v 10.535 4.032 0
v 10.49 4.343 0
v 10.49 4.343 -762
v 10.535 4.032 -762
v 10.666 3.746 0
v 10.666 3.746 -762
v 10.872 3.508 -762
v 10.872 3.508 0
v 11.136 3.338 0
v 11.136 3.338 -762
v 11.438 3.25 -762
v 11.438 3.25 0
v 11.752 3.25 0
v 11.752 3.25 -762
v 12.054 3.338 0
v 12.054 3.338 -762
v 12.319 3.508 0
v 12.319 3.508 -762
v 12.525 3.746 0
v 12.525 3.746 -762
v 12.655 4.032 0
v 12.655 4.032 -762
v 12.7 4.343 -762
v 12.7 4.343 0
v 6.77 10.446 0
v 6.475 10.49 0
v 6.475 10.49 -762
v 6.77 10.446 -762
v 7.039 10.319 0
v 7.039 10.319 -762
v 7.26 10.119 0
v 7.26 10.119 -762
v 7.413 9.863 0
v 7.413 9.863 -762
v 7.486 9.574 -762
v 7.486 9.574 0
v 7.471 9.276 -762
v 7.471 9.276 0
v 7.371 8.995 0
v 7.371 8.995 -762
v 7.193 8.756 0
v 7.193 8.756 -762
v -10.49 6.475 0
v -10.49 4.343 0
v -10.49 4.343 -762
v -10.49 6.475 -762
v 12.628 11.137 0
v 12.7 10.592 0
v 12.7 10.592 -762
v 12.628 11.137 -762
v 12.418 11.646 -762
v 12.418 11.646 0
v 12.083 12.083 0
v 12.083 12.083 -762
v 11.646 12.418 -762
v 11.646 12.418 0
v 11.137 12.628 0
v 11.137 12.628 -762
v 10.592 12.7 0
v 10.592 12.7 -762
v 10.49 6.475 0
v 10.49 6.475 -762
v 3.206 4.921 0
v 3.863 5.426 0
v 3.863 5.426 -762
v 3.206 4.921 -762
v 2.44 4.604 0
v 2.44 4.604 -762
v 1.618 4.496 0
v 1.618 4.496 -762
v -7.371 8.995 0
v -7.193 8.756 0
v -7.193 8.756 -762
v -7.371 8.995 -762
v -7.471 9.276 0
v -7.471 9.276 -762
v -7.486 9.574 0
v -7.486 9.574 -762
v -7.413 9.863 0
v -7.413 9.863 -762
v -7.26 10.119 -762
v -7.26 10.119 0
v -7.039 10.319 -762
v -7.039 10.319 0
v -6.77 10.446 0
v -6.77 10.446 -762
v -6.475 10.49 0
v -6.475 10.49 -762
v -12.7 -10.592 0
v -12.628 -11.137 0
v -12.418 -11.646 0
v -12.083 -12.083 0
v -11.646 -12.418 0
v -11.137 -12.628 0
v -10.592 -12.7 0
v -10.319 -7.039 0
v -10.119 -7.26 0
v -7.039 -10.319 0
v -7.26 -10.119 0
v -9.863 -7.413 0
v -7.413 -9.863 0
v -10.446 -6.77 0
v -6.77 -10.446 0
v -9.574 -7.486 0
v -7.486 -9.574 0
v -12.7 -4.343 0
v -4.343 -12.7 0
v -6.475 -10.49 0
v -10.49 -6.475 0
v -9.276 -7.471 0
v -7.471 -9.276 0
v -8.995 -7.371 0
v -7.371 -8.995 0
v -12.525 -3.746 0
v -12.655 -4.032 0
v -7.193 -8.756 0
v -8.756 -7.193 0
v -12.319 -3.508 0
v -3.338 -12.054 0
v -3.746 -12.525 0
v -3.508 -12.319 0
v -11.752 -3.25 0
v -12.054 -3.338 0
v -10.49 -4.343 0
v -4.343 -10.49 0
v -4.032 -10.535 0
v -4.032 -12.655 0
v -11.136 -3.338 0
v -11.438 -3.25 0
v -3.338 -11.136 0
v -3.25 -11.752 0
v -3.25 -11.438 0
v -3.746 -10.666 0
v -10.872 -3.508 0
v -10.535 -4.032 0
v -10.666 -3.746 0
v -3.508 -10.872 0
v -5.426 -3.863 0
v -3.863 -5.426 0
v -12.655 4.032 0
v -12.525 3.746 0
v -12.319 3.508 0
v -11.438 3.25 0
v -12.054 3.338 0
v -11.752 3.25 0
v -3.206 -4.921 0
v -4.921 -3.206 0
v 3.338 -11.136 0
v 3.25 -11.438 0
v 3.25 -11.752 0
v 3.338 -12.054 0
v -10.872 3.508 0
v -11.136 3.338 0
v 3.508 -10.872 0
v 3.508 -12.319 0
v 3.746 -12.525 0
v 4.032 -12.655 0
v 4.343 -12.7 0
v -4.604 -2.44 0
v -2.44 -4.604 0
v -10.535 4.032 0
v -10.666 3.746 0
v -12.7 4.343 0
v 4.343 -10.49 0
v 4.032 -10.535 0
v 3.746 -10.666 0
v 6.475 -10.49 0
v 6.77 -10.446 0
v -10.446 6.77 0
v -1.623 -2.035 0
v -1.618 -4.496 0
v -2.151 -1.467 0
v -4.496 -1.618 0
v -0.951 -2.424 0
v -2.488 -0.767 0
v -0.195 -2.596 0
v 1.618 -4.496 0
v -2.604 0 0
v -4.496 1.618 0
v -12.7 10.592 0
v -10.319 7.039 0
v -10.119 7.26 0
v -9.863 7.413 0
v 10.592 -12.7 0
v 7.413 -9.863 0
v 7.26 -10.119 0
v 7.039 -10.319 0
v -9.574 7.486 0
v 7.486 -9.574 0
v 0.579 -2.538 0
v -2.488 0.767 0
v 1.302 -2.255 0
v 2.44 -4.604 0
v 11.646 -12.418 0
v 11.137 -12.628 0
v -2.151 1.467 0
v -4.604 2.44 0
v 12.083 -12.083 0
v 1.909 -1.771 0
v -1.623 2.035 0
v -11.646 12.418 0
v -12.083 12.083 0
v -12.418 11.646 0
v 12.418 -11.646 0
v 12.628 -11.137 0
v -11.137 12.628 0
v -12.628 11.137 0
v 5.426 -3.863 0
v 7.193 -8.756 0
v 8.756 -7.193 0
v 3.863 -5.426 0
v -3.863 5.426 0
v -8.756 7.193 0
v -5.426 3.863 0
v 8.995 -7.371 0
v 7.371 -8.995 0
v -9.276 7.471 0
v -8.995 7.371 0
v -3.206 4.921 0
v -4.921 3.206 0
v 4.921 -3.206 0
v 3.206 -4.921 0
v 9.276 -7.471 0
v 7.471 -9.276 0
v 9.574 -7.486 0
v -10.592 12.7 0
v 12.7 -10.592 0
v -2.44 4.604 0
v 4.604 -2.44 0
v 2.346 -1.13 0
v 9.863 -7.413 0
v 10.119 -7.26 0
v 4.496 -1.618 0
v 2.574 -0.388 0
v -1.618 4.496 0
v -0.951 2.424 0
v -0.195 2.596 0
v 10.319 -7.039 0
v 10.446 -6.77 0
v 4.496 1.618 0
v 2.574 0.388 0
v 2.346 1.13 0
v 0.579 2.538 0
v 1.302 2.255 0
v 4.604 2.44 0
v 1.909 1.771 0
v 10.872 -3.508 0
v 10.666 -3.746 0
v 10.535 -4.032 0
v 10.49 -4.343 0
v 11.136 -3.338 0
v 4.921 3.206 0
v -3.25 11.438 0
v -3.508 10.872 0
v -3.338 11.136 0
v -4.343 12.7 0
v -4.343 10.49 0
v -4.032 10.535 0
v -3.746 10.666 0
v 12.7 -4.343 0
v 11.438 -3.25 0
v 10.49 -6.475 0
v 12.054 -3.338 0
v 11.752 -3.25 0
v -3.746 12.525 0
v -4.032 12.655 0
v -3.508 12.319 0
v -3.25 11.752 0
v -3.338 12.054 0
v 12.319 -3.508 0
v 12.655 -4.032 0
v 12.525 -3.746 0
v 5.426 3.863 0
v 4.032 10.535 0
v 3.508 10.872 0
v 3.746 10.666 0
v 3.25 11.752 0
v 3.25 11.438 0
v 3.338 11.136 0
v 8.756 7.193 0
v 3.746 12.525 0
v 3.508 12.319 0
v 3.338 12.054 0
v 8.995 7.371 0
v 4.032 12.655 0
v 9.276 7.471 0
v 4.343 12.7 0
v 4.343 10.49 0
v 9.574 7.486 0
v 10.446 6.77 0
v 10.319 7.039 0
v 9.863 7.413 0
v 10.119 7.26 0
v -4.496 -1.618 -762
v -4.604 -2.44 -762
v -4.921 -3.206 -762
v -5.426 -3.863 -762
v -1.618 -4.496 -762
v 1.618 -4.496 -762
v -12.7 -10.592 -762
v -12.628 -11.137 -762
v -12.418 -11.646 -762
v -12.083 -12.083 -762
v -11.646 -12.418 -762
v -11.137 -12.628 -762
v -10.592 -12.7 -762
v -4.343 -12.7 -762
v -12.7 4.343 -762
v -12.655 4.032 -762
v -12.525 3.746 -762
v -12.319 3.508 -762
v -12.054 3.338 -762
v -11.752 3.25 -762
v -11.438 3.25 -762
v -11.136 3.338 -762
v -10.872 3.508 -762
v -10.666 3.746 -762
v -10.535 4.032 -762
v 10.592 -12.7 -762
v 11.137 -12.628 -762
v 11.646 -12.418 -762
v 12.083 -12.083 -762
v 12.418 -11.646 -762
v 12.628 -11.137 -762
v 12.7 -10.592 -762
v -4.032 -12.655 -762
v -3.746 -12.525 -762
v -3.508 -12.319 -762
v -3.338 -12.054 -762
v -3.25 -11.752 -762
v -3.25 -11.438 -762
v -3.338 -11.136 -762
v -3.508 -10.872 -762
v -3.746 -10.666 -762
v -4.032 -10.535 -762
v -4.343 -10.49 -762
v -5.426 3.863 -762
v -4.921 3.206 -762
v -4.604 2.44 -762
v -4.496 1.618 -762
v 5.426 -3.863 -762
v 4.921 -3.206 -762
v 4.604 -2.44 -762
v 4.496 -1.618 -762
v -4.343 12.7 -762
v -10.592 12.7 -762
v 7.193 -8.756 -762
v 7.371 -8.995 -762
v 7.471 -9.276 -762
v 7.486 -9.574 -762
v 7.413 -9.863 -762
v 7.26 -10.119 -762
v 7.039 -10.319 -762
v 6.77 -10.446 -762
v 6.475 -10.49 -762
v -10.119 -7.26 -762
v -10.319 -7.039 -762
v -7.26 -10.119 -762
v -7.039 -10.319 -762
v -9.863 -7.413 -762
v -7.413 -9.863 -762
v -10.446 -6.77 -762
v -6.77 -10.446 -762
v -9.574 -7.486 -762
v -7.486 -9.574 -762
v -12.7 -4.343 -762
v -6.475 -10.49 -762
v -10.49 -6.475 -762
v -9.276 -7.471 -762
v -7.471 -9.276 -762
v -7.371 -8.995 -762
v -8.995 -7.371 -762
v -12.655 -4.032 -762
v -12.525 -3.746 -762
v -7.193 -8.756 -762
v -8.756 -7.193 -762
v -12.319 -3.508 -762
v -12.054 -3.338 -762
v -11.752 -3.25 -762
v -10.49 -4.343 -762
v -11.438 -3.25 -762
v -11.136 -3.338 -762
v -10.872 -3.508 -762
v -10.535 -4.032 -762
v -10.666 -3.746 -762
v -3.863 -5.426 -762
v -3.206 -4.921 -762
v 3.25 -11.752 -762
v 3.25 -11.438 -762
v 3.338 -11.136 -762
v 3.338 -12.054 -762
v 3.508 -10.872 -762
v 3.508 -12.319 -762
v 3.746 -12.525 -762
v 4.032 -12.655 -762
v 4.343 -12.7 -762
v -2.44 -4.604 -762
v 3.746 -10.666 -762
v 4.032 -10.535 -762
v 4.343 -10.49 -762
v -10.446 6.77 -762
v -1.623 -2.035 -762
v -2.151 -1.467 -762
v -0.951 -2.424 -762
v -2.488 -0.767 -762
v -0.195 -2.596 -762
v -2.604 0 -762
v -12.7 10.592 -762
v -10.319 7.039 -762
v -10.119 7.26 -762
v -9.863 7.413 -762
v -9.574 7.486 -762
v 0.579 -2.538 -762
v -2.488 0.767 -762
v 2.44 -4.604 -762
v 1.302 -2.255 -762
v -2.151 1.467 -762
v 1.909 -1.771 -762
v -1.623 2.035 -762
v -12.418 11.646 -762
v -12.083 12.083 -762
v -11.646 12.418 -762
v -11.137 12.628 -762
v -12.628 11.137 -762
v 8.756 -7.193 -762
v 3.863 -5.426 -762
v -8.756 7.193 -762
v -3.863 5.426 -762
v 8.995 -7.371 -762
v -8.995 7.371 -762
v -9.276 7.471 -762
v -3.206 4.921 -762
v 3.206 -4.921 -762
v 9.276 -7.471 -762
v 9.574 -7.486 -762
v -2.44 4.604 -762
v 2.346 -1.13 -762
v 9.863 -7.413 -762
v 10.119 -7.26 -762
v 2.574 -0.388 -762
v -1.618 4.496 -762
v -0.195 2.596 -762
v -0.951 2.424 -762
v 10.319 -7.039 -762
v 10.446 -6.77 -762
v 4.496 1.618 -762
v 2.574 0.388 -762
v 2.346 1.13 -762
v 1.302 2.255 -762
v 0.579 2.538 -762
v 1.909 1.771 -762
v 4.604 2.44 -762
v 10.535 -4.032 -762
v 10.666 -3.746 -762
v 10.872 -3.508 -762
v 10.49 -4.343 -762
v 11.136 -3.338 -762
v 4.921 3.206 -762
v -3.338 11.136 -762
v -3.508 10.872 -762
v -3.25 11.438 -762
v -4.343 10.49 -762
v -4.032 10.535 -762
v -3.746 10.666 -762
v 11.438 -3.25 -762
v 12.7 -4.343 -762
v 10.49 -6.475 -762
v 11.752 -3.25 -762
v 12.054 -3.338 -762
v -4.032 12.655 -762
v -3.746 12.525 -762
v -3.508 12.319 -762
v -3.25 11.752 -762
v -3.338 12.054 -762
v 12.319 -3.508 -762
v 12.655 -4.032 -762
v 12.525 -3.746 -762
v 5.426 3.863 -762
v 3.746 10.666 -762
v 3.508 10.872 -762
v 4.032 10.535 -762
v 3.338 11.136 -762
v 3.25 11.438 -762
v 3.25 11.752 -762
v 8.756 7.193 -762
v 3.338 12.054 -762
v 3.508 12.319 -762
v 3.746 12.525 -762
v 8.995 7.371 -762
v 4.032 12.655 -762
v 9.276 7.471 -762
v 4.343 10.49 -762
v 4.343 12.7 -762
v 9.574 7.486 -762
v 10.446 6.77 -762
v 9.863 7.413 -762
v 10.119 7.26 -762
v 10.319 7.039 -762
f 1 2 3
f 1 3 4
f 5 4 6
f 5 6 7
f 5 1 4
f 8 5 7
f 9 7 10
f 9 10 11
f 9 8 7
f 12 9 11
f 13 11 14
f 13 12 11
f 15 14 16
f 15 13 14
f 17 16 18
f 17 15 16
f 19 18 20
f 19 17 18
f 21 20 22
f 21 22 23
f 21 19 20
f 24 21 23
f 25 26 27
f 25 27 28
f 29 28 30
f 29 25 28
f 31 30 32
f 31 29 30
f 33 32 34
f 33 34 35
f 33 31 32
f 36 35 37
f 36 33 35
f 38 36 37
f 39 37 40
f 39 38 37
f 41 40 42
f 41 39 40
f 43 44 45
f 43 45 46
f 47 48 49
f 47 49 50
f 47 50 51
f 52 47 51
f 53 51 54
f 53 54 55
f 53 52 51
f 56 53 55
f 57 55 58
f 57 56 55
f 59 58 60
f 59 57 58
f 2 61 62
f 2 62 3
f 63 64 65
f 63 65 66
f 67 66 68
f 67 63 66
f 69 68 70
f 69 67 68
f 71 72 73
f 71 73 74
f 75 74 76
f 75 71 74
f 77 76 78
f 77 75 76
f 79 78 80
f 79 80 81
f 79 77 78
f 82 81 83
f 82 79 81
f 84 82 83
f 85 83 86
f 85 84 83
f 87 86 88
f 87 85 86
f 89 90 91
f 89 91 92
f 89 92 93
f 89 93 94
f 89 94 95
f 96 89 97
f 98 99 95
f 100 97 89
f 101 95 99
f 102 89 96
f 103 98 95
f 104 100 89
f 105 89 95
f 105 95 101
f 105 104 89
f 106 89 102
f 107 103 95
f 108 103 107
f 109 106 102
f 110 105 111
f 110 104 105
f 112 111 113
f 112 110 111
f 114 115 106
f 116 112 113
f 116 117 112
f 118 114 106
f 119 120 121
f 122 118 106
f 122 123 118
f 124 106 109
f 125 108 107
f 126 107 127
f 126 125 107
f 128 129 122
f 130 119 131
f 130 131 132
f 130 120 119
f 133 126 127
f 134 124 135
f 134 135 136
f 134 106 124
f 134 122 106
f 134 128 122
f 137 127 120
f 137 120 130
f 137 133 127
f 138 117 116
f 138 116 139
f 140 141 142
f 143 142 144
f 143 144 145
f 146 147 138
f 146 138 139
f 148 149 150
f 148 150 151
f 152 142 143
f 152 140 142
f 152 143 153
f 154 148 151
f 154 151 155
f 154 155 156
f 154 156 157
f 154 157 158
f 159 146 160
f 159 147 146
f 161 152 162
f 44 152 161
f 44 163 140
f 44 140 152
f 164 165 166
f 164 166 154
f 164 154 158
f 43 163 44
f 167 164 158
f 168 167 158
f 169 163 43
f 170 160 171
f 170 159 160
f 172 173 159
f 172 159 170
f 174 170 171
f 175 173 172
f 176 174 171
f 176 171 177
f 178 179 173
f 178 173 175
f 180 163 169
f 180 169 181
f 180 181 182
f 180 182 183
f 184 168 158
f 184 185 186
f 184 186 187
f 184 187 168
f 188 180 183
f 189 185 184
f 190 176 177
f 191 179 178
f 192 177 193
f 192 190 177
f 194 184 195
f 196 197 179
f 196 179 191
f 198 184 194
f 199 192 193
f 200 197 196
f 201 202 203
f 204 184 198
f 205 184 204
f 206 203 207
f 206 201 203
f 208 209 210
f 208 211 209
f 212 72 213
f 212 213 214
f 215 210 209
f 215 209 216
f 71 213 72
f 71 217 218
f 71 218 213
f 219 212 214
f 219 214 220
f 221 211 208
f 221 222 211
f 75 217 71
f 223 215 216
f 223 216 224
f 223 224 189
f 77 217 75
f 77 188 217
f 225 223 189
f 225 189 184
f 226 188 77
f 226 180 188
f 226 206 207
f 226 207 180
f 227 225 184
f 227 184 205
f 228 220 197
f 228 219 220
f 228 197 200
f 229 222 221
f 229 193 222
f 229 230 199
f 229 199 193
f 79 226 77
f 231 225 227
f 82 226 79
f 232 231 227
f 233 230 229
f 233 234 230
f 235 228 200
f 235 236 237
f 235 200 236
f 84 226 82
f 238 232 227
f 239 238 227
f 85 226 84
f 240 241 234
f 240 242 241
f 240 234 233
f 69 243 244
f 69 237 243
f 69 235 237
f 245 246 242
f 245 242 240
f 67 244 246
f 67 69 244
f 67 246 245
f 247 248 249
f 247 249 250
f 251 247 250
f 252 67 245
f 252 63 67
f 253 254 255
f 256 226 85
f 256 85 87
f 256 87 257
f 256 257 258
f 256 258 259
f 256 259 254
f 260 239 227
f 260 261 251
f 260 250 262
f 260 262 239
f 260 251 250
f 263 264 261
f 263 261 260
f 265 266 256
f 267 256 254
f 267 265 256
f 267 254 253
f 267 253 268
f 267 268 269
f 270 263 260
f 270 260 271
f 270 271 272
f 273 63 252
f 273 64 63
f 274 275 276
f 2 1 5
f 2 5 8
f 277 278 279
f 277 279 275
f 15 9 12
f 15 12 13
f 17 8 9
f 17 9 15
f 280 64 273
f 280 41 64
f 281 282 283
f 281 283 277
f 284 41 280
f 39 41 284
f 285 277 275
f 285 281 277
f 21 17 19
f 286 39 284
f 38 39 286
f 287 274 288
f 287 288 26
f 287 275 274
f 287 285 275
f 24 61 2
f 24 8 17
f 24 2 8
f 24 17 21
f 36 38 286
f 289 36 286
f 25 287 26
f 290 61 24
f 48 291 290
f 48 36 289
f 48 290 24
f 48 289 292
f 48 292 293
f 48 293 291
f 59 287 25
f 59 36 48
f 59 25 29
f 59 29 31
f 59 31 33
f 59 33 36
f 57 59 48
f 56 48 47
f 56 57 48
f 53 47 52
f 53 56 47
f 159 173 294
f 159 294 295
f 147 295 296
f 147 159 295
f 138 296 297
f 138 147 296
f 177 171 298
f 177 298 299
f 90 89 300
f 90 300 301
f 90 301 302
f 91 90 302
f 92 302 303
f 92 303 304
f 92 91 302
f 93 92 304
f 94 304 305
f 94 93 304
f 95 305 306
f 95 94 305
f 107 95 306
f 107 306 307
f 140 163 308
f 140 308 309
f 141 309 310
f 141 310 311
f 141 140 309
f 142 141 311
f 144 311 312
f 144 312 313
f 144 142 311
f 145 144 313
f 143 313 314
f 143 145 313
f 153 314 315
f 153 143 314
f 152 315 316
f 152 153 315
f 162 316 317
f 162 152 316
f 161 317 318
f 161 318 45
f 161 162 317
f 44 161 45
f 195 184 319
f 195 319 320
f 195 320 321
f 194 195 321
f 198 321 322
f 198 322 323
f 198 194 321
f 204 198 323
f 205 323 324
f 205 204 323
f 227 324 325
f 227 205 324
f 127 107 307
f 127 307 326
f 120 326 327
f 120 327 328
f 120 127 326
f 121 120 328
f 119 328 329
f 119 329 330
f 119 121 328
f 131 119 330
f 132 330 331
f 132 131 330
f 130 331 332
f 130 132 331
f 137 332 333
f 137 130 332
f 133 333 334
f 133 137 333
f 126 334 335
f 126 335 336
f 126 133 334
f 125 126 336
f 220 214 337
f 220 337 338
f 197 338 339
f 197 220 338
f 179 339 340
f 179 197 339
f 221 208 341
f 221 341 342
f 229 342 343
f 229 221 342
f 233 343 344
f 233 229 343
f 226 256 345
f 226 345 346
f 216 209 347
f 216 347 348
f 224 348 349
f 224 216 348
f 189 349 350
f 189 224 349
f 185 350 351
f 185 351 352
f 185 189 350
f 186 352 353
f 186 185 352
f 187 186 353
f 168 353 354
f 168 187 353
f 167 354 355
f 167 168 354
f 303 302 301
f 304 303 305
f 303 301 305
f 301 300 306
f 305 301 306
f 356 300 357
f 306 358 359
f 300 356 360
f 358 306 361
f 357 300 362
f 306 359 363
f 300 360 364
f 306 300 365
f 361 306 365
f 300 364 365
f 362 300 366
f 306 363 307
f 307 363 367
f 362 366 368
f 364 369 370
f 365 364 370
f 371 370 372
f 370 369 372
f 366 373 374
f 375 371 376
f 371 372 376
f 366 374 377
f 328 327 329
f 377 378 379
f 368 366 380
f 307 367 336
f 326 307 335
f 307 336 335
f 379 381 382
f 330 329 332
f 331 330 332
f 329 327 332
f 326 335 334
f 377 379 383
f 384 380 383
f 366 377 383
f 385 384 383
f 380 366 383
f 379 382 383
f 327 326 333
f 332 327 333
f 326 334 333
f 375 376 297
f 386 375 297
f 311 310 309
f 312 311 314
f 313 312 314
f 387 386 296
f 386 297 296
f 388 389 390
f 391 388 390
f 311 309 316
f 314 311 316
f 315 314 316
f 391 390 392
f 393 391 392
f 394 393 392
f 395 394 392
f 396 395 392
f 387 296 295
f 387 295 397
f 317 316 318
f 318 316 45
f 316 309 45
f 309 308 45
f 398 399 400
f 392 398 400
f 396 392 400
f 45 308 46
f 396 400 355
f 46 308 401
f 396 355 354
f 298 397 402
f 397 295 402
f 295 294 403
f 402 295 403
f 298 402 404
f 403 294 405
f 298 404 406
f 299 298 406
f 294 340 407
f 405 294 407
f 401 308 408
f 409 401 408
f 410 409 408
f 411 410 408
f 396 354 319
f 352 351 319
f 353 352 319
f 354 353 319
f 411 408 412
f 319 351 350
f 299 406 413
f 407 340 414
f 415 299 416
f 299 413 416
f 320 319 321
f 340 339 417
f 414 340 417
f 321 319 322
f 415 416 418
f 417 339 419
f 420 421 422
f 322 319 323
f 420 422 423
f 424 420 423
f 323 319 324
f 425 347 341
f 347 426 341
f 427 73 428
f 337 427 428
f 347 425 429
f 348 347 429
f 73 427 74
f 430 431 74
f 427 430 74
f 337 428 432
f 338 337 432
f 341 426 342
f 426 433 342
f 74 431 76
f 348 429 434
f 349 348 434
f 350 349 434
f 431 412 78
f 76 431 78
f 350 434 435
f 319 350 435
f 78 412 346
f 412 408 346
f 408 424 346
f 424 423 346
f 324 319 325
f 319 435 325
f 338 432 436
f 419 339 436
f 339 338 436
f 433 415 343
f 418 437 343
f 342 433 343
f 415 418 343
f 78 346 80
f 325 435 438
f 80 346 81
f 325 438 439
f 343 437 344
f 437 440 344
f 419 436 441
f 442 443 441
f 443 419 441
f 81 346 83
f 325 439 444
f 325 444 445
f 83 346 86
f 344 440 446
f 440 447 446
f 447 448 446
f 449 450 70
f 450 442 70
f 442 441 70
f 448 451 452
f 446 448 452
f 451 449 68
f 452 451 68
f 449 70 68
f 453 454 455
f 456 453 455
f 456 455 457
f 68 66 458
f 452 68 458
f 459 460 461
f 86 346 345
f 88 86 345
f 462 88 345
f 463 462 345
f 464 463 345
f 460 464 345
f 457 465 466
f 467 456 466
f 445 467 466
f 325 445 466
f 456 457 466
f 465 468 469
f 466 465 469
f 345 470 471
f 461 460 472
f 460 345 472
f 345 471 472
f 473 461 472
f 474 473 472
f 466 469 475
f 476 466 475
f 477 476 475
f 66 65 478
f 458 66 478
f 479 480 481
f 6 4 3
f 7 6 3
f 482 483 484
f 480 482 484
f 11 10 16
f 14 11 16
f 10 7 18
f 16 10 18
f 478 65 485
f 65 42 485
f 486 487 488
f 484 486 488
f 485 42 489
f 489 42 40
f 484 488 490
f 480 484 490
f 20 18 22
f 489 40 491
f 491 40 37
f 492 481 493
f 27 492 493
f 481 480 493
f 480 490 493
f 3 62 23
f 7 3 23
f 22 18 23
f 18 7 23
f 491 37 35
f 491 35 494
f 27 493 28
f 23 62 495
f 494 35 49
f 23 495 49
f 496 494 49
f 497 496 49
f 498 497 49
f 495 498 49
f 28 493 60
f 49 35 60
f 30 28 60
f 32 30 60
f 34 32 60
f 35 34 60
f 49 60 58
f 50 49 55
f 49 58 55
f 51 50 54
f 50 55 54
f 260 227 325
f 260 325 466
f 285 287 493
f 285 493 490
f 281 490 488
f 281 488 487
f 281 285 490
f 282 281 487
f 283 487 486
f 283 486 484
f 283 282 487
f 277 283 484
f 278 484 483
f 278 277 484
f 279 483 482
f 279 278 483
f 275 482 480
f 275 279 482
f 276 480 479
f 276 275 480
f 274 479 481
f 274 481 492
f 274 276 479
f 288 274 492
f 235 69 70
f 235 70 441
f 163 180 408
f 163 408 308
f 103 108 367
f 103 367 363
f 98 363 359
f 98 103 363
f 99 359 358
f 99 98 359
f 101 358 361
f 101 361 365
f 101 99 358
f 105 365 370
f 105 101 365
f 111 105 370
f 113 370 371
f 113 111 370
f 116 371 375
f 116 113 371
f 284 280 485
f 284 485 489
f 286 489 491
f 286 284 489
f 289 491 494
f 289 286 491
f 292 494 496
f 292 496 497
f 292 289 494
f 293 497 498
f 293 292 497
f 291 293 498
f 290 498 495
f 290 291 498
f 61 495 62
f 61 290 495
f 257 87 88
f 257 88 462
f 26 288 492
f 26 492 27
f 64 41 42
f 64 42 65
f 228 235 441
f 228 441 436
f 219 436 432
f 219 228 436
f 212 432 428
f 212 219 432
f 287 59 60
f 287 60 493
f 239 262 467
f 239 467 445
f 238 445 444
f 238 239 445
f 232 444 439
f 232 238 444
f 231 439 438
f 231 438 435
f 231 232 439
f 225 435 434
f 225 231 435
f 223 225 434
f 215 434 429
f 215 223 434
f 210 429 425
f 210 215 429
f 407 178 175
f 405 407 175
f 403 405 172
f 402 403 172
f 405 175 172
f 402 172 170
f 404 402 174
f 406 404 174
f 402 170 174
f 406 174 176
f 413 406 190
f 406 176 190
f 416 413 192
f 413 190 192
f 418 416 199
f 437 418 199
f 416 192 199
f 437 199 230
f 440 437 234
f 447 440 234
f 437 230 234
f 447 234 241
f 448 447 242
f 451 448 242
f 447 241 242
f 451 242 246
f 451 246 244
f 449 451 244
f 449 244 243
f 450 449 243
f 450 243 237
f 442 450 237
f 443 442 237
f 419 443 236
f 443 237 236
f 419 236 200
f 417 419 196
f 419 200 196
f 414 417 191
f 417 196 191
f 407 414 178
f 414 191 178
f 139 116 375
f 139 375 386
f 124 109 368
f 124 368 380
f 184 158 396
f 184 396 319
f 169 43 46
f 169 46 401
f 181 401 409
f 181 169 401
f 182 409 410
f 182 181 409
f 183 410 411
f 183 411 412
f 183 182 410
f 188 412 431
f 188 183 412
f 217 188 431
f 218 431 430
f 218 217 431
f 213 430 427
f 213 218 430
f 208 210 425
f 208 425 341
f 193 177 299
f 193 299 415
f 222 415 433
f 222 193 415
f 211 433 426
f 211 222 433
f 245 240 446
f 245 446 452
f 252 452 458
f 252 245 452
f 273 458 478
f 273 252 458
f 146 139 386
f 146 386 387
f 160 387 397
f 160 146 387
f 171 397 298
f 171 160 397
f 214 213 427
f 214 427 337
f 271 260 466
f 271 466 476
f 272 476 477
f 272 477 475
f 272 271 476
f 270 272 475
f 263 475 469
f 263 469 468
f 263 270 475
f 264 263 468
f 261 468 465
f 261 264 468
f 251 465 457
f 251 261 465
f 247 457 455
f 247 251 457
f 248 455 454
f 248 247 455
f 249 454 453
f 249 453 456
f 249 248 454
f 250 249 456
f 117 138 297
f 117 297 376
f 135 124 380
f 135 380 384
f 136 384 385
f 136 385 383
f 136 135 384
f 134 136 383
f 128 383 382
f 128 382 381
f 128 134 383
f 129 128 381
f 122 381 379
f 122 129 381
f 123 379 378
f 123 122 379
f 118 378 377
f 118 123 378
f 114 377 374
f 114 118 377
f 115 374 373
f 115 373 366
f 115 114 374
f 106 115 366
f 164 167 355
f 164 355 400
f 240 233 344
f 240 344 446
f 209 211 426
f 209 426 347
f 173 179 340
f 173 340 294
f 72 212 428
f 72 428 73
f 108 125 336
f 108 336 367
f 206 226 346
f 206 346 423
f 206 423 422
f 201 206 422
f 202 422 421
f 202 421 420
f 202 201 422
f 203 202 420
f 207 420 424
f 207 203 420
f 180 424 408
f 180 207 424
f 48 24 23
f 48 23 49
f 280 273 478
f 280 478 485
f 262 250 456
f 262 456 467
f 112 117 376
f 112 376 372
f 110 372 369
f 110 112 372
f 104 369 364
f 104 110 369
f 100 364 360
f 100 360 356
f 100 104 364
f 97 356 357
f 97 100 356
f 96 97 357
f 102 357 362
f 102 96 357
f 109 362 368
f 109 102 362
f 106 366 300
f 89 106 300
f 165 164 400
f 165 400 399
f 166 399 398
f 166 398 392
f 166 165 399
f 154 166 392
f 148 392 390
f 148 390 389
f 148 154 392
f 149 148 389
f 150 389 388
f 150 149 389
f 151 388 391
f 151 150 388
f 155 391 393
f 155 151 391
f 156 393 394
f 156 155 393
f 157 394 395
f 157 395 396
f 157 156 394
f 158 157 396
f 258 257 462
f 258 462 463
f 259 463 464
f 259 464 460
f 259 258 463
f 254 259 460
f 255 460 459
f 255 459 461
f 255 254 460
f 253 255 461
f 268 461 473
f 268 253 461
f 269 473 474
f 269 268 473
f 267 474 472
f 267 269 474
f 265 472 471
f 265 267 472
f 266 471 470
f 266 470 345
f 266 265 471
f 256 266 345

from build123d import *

# Parameters (mm, degrees)
SKETCH1_R           = 2.6035
BOSS_EXTRUDE1_DEPTH = 762
DELETEFACE1_START   = -762
DELETEFACE1_DEPTH   = 762


# Read off the part's stored shape, not the designer's step: DeleteFace1
with BuildPart() as part:
    # Sketch1 → Boss-Extrude1 (new body)
    with BuildSketch(Plane.XY):
        with BuildLine():
            Line((-9.5504, -12.7), (-6.3330836, -12.7))
            ThreePointArc((-6.3330836, -12.7), (-5.8250836, -12.192), (-5.3170836, -12.7))
            Line((-5.3170836, -12.7), (-4.343399971, -12.7))
            ThreePointArc((-4.343399971, -12.7), (-3.238499971, -11.5951), (-4.343399971, -10.4902))
            Line((-4.343399971, -10.4902), (-6.474794456, -10.4902))
            ThreePointArc((-6.474794456, -10.4902), (-7.413456061, -9.863006367), (-7.193214945, -8.75577951))
            Line((-7.193214945, -8.75577951), (-3.863171405, -5.42573597))
            ThreePointArc((-3.863171405, -5.42573597), (-2.833127272, -4.737482484), (-1.618107374, -4.4958))
            Line((-1.618107374, -4.4958), (1.618107374, -4.4958))
            ThreePointArc((1.618107374, -4.4958), (2.833127272, -4.737482484), (3.863171405, -5.42573597))
            Line((3.863171405, -5.42573597), (7.193214945, -8.75577951))
            ThreePointArc((7.193214945, -8.75577951), (7.413456061, -9.863006367), (6.474794456, -10.4902))
            Line((6.474794456, -10.4902), (4.3434, -10.4902))
            ThreePointArc((4.3434, -10.4902), (3.2385, -11.5951), (4.3434, -12.7))
            Line((4.3434, -12.7), (5.3170836, -12.7))
            ThreePointArc((5.3170836, -12.7), (5.8250836, -12.192), (6.3330836, -12.7))
            Line((6.3330836, -12.7), (9.5504, -12.7))
            ThreePointArc((9.5504, -12.7), (10.058323491, -12.192000006), (10.566399977, -12.699846982))
            ThreePointArc((10.566399977, -12.699846982), (12.082522516, -12.082522516), (12.699846982, -10.566399977))
            ThreePointArc((12.699846982, -10.566399977), (12.192000006, -10.058323491), (12.7, -9.5504))
            Line((12.7, -9.5504), (12.7, -6.3330836))
            ThreePointArc((12.7, -6.3330836), (12.192, -5.8250836), (12.7, -5.3170836))
            Line((12.7, -5.3170836), (12.7, -4.343399971))
            ThreePointArc((12.7, -4.343399971), (11.5951, -3.238499971), (10.4902, -4.343399971))
            Line((10.4902, -4.343399971), (10.4902, -6.474794456))
            ThreePointArc((10.4902, -6.474794456), (9.863006367, -7.413456061), (8.75577951, -7.193214945))
            Line((8.75577951, -7.193214945), (5.42573597, -3.863171405))
            ThreePointArc((5.42573597, -3.863171405), (4.737482484, -2.833127272), (4.4958, -1.618107374))
            Line((4.4958, -1.618107374), (4.4958, 1.618107374))
            ThreePointArc((4.4958, 1.618107374), (4.737482484, 2.833127272), (5.42573597, 3.863171405))
            Line((5.42573597, 3.863171405), (8.75577951, 7.193214945))
            ThreePointArc((8.75577951, 7.193214945), (9.863006367, 7.413456061), (10.4902, 6.474794456))
            Line((10.4902, 6.474794456), (10.4902, 4.3434))
            ThreePointArc((10.4902, 4.3434), (11.5951, 3.2385), (12.7, 4.3434))
            Line((12.7, 4.3434), (12.7, 5.3170836))
            ThreePointArc((12.7, 5.3170836), (12.192, 5.8250836), (12.7, 6.3330836))
            Line((12.7, 6.3330836), (12.7, 9.5504))
            ThreePointArc((12.7, 9.5504), (12.192000006, 10.058323491), (12.699846982, 10.566399977))
            ThreePointArc((12.699846982, 10.566399977), (12.082522516, 12.082522516), (10.566399977, 12.699846982))
            ThreePointArc((10.566399977, 12.699846982), (10.058323491, 12.192000006), (9.5504, 12.7))
            Line((9.5504, 12.7), (6.3330836, 12.7))
            ThreePointArc((6.3330836, 12.7), (5.8250836, 12.192), (5.3170836, 12.7))
            Line((5.3170836, 12.7), (4.343399971, 12.7))
            ThreePointArc((4.343399971, 12.7), (3.238499971, 11.5951), (4.343399971, 10.4902))
            Line((4.343399971, 10.4902), (6.474794456, 10.4902))
            ThreePointArc((6.474794456, 10.4902), (7.413456061, 9.863006367), (7.193214945, 8.75577951))
            Line((7.193214945, 8.75577951), (3.863171405, 5.42573597))
            ThreePointArc((3.863171405, 5.42573597), (2.833127272, 4.737482484), (1.618107374, 4.4958))
            Line((1.618107374, 4.4958), (-1.618107374, 4.4958))
            ThreePointArc((-1.618107374, 4.4958), (-2.833127272, 4.737482484), (-3.863171405, 5.42573597))
            Line((-3.863171405, 5.42573597), (-7.193214945, 8.75577951))
            ThreePointArc((-7.193214945, 8.75577951), (-7.413456061, 9.863006367), (-6.474794456, 10.4902))
            Line((-6.474794456, 10.4902), (-4.3434, 10.4902))
            ThreePointArc((-4.3434, 10.4902), (-3.2385, 11.5951), (-4.3434, 12.7))
            Line((-4.3434, 12.7), (-5.3170836, 12.7))
            ThreePointArc((-5.3170836, 12.7), (-5.8250836, 12.192), (-6.3330836, 12.7))
            Line((-6.3330836, 12.7), (-9.5504, 12.7))
            ThreePointArc((-9.5504, 12.7), (-10.058323491, 12.192000006), (-10.566399977, 12.699846982))
            ThreePointArc((-10.566399977, 12.699846982), (-12.082522516, 12.082522516), (-12.699846982, 10.566399977))
            ThreePointArc((-12.699846982, 10.566399977), (-12.192000006, 10.058323491), (-12.7, 9.5504))
            Line((-12.7, 9.5504), (-12.7, 6.3330836))
            ThreePointArc((-12.7, 6.3330836), (-12.192, 5.8250836), (-12.7, 5.3170836))
            Line((-12.7, 5.3170836), (-12.7, 4.343399971))
            ThreePointArc((-12.7, 4.343399971), (-11.5951, 3.238499971), (-10.4902, 4.343399971))
            Line((-10.4902, 4.343399971), (-10.4902, 6.474794456))
            ThreePointArc((-10.4902, 6.474794456), (-9.863006367, 7.413456061), (-8.75577951, 7.193214945))
            Line((-8.75577951, 7.193214945), (-5.42573597, 3.863171405))
            ThreePointArc((-5.42573597, 3.863171405), (-4.737482484, 2.833127272), (-4.4958, 1.618107374))
            Line((-4.4958, 1.618107374), (-4.4958, -1.618107374))
            ThreePointArc((-4.4958, -1.618107374), (-4.737482484, -2.833127272), (-5.42573597, -3.863171405))
            Line((-5.42573597, -3.863171405), (-8.75577951, -7.193214945))
            ThreePointArc((-8.75577951, -7.193214945), (-9.863006367, -7.413456061), (-10.4902, -6.474794456))
            Line((-10.4902, -6.474794456), (-10.4902, -4.3434))
            ThreePointArc((-10.4902, -4.3434), (-11.5951, -3.2385), (-12.7, -4.3434))
            Line((-12.7, -4.3434), (-12.7, -5.3170836))
            ThreePointArc((-12.7, -5.3170836), (-12.192, -5.8250836), (-12.7, -6.3330836))
            Line((-12.7, -6.3330836), (-12.7, -9.5504))
            ThreePointArc((-12.7, -9.5504), (-12.192000006, -10.058323491), (-12.699846982, -10.566399977))
            ThreePointArc((-12.699846982, -10.566399977), (-12.082522516, -12.082522516), (-10.566399977, -12.699846982))
            ThreePointArc((-10.566399977, -12.699846982), (-10.058323491, -12.192000006), (-9.5504, -12.7))
        make_face()
        with Locations(Location((0, 0, 0), (0, 0, 180))):
            Circle(SKETCH1_R, mode=Mode.SUBTRACT)
    extrude(amount=-BOSS_EXTRUDE1_DEPTH)

    # DeleteFace1 outline → DeleteFace1 (add)
    with BuildSketch(Plane.XY.offset(DELETEFACE1_START)):
        with BuildLine():
            ThreePointArc((-12.7, -6.3330836), (-12.192, -5.8250836), (-12.7, -5.3170836))
            Line((-12.7, -5.3170836), (-12.7, -6.3330836))
        make_face()
        with BuildLine():
            ThreePointArc((-5.3170836, -12.7), (-5.8250836, -12.192), (-6.3330836, -12.7))
            Line((-6.3330836, -12.7), (-5.3170836, -12.7))
        make_face()
        with BuildLine():
            ThreePointArc((-10.566399977, -12.699846982), (-10.579099758, -12.699961745), (-10.5918, -12.7))
            Line((-10.5918, -12.7), (-9.5504, -12.7))
            ThreePointArc((-9.5504, -12.7), (-10.058323491, -12.192000006), (-10.566399977, -12.699846982))
        make_face()
        with BuildLine():
            ThreePointArc((-12.699846982, -10.566399977), (-12.192000006, -10.058323491), (-12.7, -9.5504))
            Line((-12.7, -9.5504), (-12.7, -10.5918))
            ThreePointArc((-12.7, -10.5918), (-12.699961745, -10.579099758), (-12.699846982, -10.566399977))
        make_face()
        with BuildLine():
            ThreePointArc((-12.699846982, 10.566399977), (-12.699961745, 10.579099758), (-12.7, 10.5918))
            Line((-12.7, 10.5918), (-12.7, 9.5504))
            ThreePointArc((-12.7, 9.5504), (-12.192000006, 10.058323491), (-12.699846982, 10.566399977))
        make_face()
        with BuildLine():
            Line((-5.3170836, 12.7), (-6.3330836, 12.7))
            ThreePointArc((-6.3330836, 12.7), (-5.8250836, 12.192), (-5.3170836, 12.7))
        make_face()
        with BuildLine():
            Line((-9.5504, 12.7), (-10.5918, 12.7))
            ThreePointArc((-10.5918, 12.7), (-10.579099758, 12.699961745), (-10.566399977, 12.699846982))
            ThreePointArc((-10.566399977, 12.699846982), (-10.058323491, 12.192000006), (-9.5504, 12.7))
        make_face()
        with BuildLine():
            ThreePointArc((-12.7, 5.3170836), (-12.192, 5.8250836), (-12.7, 6.3330836))
            Line((-12.7, 6.3330836), (-12.7, 5.3170836))
        make_face()
        with BuildLine():
            ThreePointArc((10.566399977, 12.699846982), (10.579099758, 12.699961745), (10.5918, 12.7))
            Line((10.5918, 12.7), (9.5504, 12.7))
            ThreePointArc((9.5504, 12.7), (10.058323491, 12.192000006), (10.566399977, 12.699846982))
        make_face()
        with BuildLine():
            Line((12.7, 5.3170836), (12.7, 6.3330836))
            ThreePointArc((12.7, 6.3330836), (12.192, 5.8250836), (12.7, 5.3170836))
        make_face()
        with BuildLine():
            Line((12.7, 9.5504), (12.7, 10.5918))
            ThreePointArc((12.7, 10.5918), (12.699961745, 10.579099758), (12.699846982, 10.566399977))
            ThreePointArc((12.699846982, 10.566399977), (12.192000006, 10.058323491), (12.7, 9.5504))
        make_face()
        with BuildLine():
            ThreePointArc((5.3170836, 12.7), (5.8250836, 12.192), (6.3330836, 12.7))
            Line((6.3330836, 12.7), (5.3170836, 12.7))
        make_face()
        with BuildLine():
            ThreePointArc((12.699846982, -10.566399977), (12.699961745, -10.579099758), (12.7, -10.5918))
            Line((12.7, -10.5918), (12.7, -9.5504))
            ThreePointArc((12.7, -9.5504), (12.192000006, -10.058323491), (12.699846982, -10.566399977))
        make_face()
        with BuildLine():
            Line((5.3170836, -12.7), (6.3330836, -12.7))
            ThreePointArc((6.3330836, -12.7), (5.8250836, -12.192), (5.3170836, -12.7))
        make_face()
        with BuildLine():
            Line((9.5504, -12.7), (10.5918, -12.7))
            ThreePointArc((10.5918, -12.7), (10.579099758, -12.699961745), (10.566399977, -12.699846982))
            ThreePointArc((10.566399977, -12.699846982), (10.058323491, -12.192000006), (9.5504, -12.7))
        make_face()
        with BuildLine():
            ThreePointArc((12.7, -5.3170836), (12.192, -5.8250836), (12.7, -6.3330836))
            Line((12.7, -6.3330836), (12.7, -5.3170836))
        make_face()
    extrude(amount=DELETEFACE1_DEPTH)


solid = part.part
